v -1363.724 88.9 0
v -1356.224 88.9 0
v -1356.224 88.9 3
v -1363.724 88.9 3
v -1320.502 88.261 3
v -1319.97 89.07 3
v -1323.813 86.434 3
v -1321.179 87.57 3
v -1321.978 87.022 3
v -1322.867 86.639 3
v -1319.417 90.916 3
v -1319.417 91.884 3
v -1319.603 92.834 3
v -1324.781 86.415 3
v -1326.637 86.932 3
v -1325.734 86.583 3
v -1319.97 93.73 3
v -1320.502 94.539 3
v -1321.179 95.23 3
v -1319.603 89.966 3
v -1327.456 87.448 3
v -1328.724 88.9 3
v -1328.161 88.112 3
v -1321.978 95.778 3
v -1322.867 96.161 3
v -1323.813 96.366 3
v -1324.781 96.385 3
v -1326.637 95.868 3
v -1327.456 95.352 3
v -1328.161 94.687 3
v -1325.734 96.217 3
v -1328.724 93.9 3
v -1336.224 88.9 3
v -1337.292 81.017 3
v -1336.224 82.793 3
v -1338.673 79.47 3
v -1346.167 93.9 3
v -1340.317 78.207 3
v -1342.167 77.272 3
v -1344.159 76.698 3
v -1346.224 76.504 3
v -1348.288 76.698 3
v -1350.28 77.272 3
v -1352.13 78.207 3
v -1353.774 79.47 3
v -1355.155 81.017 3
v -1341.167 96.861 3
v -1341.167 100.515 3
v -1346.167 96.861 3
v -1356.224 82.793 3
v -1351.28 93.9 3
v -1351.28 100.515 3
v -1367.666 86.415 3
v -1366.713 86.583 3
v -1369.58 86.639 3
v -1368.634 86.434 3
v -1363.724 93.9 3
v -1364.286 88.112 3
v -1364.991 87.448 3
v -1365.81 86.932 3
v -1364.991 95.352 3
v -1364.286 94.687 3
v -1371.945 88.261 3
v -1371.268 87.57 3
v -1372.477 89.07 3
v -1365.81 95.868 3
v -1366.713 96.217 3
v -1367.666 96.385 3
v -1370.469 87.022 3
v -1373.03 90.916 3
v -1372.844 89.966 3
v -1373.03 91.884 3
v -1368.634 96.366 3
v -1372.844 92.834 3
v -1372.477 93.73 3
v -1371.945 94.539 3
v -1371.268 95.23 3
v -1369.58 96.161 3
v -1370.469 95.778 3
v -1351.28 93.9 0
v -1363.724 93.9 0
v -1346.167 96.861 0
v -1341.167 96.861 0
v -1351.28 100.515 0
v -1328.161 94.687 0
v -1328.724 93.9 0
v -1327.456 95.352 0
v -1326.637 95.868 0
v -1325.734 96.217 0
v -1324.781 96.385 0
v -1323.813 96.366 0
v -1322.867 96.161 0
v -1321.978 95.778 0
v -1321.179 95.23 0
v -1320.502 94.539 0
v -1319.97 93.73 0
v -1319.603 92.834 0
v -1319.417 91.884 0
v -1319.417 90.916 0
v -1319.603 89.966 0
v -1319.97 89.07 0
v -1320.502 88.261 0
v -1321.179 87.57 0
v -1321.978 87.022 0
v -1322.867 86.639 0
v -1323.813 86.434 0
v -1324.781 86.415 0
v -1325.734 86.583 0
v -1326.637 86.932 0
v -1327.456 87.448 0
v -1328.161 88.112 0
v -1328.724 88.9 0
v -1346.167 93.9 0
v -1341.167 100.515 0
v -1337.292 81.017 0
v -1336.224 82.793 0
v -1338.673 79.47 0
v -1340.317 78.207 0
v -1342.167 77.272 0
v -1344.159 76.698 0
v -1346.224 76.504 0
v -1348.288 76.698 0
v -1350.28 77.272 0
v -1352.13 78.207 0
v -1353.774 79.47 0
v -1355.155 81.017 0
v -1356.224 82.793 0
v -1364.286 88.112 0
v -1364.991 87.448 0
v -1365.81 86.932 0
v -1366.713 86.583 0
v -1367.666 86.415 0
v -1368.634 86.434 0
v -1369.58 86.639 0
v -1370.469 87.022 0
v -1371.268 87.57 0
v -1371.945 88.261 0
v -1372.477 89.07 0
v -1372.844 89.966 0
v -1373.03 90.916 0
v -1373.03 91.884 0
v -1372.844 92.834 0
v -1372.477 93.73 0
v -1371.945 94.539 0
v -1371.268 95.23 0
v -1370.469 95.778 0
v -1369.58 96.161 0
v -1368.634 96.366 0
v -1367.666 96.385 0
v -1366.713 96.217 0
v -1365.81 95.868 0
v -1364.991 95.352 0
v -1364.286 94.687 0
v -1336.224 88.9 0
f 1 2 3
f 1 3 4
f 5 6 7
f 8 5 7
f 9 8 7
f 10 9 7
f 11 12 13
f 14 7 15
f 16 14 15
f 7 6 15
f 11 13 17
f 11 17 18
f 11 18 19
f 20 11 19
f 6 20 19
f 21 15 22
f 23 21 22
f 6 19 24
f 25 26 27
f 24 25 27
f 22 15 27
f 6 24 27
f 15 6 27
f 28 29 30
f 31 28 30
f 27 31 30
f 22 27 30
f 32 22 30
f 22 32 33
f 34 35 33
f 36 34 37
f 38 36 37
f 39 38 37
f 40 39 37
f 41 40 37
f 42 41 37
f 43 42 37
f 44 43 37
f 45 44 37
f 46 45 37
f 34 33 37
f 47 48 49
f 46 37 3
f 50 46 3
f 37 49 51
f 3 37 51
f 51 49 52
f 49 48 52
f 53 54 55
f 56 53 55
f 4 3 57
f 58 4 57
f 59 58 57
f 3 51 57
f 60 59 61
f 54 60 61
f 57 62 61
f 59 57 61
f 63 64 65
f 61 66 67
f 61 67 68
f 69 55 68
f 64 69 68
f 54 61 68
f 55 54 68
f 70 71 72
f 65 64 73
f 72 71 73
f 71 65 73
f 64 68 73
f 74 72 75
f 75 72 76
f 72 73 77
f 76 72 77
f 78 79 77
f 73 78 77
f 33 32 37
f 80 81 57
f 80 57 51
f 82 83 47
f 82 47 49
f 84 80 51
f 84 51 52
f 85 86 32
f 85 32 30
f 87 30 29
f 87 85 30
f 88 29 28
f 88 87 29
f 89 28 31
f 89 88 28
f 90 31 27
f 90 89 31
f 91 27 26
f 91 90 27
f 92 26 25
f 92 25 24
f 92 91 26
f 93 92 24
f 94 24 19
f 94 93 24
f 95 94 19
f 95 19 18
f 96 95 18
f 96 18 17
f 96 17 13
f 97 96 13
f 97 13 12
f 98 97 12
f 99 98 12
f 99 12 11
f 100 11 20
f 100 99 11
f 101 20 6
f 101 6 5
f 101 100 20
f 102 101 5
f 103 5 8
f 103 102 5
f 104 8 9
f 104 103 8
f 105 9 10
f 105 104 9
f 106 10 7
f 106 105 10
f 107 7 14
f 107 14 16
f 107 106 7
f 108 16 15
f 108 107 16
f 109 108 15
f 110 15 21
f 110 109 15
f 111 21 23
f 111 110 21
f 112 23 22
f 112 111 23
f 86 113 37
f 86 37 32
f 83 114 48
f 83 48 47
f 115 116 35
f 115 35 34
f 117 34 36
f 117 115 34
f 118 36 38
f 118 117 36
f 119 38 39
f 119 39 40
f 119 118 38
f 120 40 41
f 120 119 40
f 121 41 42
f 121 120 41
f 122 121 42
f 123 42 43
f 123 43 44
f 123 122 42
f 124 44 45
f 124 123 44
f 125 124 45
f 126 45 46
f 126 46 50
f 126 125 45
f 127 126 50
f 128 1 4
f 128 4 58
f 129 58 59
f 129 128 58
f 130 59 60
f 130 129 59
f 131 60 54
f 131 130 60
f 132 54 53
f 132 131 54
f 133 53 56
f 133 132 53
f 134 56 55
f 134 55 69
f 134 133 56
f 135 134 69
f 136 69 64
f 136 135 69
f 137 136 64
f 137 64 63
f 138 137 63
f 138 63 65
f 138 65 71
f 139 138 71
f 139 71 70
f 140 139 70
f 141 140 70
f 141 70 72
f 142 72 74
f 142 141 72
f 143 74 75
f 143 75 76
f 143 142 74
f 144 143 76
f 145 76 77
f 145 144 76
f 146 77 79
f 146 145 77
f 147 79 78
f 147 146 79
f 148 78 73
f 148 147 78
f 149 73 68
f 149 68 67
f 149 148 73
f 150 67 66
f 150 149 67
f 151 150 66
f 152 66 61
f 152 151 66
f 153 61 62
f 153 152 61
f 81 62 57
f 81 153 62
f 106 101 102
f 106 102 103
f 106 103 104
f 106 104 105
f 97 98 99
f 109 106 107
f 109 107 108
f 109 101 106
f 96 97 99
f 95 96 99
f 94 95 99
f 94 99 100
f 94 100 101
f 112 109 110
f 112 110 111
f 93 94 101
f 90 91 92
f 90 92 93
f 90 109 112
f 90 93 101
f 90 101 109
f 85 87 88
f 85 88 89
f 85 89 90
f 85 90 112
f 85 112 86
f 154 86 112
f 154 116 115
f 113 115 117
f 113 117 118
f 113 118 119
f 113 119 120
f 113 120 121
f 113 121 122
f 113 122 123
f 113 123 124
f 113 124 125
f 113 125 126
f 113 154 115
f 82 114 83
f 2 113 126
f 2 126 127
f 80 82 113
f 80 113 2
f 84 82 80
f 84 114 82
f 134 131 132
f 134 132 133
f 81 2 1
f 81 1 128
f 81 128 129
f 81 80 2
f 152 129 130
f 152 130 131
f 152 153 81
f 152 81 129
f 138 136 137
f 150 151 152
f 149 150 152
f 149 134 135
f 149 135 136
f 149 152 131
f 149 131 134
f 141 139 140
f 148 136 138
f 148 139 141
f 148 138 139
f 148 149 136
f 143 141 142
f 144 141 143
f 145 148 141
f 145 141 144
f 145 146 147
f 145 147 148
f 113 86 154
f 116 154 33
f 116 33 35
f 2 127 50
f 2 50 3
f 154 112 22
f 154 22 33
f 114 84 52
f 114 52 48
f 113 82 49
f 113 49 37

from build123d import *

# Parameters (mm, degrees)
BASE_EXTRUDE_DEPTH = 3


with BuildPart() as part:
    # Sketch1 → Base-Extrude (new body)
    with BuildSketch(Plane.XY):
        with BuildLine():
            Line((-1351.280186532, 100.515097097), (-1341.166910128, 100.515097097))
            Line((-1341.166910128, 100.515097097), (-1341.166910128, 96.861073329))
            Line((-1341.166910128, 96.861073329), (-1346.166910128, 96.861073329))
            Line((-1346.166910128, 96.861073329), (-1346.166910128, 93.899820126))
            Line((-1346.166910128, 93.899820126), (-1328.72354833, 93.899820126))
            ThreePointArc((-1328.72354833, 93.899820126), (-1319.393421311, 91.399820126), (-1328.72354833, 88.899820126))
            Line((-1328.72354833, 88.899820126), (-1336.22354833, 88.899820126))
            Line((-1336.22354833, 88.899820126), (-1336.22354833, 82.793437515))
            ThreePointArc((-1336.22354833, 82.793437515), (-1346.22354833, 76.504450604), (-1356.22354833, 82.793437515))
            Line((-1356.22354833, 82.793437515), (-1356.22354833, 88.899820126))
            Line((-1356.22354833, 88.899820126), (-1363.72354833, 88.899820126))
            ThreePointArc((-1363.72354833, 88.899820126), (-1373.053675349, 91.399820126), (-1363.72354833, 93.899820126))
            Line((-1363.72354833, 93.899820126), (-1351.280186532, 93.899820126))
            Line((-1351.280186532, 93.899820126), (-1351.280186532, 100.515097097))
        make_face()
    extrude(amount=BASE_EXTRUDE_DEPTH)


solid = part.part
